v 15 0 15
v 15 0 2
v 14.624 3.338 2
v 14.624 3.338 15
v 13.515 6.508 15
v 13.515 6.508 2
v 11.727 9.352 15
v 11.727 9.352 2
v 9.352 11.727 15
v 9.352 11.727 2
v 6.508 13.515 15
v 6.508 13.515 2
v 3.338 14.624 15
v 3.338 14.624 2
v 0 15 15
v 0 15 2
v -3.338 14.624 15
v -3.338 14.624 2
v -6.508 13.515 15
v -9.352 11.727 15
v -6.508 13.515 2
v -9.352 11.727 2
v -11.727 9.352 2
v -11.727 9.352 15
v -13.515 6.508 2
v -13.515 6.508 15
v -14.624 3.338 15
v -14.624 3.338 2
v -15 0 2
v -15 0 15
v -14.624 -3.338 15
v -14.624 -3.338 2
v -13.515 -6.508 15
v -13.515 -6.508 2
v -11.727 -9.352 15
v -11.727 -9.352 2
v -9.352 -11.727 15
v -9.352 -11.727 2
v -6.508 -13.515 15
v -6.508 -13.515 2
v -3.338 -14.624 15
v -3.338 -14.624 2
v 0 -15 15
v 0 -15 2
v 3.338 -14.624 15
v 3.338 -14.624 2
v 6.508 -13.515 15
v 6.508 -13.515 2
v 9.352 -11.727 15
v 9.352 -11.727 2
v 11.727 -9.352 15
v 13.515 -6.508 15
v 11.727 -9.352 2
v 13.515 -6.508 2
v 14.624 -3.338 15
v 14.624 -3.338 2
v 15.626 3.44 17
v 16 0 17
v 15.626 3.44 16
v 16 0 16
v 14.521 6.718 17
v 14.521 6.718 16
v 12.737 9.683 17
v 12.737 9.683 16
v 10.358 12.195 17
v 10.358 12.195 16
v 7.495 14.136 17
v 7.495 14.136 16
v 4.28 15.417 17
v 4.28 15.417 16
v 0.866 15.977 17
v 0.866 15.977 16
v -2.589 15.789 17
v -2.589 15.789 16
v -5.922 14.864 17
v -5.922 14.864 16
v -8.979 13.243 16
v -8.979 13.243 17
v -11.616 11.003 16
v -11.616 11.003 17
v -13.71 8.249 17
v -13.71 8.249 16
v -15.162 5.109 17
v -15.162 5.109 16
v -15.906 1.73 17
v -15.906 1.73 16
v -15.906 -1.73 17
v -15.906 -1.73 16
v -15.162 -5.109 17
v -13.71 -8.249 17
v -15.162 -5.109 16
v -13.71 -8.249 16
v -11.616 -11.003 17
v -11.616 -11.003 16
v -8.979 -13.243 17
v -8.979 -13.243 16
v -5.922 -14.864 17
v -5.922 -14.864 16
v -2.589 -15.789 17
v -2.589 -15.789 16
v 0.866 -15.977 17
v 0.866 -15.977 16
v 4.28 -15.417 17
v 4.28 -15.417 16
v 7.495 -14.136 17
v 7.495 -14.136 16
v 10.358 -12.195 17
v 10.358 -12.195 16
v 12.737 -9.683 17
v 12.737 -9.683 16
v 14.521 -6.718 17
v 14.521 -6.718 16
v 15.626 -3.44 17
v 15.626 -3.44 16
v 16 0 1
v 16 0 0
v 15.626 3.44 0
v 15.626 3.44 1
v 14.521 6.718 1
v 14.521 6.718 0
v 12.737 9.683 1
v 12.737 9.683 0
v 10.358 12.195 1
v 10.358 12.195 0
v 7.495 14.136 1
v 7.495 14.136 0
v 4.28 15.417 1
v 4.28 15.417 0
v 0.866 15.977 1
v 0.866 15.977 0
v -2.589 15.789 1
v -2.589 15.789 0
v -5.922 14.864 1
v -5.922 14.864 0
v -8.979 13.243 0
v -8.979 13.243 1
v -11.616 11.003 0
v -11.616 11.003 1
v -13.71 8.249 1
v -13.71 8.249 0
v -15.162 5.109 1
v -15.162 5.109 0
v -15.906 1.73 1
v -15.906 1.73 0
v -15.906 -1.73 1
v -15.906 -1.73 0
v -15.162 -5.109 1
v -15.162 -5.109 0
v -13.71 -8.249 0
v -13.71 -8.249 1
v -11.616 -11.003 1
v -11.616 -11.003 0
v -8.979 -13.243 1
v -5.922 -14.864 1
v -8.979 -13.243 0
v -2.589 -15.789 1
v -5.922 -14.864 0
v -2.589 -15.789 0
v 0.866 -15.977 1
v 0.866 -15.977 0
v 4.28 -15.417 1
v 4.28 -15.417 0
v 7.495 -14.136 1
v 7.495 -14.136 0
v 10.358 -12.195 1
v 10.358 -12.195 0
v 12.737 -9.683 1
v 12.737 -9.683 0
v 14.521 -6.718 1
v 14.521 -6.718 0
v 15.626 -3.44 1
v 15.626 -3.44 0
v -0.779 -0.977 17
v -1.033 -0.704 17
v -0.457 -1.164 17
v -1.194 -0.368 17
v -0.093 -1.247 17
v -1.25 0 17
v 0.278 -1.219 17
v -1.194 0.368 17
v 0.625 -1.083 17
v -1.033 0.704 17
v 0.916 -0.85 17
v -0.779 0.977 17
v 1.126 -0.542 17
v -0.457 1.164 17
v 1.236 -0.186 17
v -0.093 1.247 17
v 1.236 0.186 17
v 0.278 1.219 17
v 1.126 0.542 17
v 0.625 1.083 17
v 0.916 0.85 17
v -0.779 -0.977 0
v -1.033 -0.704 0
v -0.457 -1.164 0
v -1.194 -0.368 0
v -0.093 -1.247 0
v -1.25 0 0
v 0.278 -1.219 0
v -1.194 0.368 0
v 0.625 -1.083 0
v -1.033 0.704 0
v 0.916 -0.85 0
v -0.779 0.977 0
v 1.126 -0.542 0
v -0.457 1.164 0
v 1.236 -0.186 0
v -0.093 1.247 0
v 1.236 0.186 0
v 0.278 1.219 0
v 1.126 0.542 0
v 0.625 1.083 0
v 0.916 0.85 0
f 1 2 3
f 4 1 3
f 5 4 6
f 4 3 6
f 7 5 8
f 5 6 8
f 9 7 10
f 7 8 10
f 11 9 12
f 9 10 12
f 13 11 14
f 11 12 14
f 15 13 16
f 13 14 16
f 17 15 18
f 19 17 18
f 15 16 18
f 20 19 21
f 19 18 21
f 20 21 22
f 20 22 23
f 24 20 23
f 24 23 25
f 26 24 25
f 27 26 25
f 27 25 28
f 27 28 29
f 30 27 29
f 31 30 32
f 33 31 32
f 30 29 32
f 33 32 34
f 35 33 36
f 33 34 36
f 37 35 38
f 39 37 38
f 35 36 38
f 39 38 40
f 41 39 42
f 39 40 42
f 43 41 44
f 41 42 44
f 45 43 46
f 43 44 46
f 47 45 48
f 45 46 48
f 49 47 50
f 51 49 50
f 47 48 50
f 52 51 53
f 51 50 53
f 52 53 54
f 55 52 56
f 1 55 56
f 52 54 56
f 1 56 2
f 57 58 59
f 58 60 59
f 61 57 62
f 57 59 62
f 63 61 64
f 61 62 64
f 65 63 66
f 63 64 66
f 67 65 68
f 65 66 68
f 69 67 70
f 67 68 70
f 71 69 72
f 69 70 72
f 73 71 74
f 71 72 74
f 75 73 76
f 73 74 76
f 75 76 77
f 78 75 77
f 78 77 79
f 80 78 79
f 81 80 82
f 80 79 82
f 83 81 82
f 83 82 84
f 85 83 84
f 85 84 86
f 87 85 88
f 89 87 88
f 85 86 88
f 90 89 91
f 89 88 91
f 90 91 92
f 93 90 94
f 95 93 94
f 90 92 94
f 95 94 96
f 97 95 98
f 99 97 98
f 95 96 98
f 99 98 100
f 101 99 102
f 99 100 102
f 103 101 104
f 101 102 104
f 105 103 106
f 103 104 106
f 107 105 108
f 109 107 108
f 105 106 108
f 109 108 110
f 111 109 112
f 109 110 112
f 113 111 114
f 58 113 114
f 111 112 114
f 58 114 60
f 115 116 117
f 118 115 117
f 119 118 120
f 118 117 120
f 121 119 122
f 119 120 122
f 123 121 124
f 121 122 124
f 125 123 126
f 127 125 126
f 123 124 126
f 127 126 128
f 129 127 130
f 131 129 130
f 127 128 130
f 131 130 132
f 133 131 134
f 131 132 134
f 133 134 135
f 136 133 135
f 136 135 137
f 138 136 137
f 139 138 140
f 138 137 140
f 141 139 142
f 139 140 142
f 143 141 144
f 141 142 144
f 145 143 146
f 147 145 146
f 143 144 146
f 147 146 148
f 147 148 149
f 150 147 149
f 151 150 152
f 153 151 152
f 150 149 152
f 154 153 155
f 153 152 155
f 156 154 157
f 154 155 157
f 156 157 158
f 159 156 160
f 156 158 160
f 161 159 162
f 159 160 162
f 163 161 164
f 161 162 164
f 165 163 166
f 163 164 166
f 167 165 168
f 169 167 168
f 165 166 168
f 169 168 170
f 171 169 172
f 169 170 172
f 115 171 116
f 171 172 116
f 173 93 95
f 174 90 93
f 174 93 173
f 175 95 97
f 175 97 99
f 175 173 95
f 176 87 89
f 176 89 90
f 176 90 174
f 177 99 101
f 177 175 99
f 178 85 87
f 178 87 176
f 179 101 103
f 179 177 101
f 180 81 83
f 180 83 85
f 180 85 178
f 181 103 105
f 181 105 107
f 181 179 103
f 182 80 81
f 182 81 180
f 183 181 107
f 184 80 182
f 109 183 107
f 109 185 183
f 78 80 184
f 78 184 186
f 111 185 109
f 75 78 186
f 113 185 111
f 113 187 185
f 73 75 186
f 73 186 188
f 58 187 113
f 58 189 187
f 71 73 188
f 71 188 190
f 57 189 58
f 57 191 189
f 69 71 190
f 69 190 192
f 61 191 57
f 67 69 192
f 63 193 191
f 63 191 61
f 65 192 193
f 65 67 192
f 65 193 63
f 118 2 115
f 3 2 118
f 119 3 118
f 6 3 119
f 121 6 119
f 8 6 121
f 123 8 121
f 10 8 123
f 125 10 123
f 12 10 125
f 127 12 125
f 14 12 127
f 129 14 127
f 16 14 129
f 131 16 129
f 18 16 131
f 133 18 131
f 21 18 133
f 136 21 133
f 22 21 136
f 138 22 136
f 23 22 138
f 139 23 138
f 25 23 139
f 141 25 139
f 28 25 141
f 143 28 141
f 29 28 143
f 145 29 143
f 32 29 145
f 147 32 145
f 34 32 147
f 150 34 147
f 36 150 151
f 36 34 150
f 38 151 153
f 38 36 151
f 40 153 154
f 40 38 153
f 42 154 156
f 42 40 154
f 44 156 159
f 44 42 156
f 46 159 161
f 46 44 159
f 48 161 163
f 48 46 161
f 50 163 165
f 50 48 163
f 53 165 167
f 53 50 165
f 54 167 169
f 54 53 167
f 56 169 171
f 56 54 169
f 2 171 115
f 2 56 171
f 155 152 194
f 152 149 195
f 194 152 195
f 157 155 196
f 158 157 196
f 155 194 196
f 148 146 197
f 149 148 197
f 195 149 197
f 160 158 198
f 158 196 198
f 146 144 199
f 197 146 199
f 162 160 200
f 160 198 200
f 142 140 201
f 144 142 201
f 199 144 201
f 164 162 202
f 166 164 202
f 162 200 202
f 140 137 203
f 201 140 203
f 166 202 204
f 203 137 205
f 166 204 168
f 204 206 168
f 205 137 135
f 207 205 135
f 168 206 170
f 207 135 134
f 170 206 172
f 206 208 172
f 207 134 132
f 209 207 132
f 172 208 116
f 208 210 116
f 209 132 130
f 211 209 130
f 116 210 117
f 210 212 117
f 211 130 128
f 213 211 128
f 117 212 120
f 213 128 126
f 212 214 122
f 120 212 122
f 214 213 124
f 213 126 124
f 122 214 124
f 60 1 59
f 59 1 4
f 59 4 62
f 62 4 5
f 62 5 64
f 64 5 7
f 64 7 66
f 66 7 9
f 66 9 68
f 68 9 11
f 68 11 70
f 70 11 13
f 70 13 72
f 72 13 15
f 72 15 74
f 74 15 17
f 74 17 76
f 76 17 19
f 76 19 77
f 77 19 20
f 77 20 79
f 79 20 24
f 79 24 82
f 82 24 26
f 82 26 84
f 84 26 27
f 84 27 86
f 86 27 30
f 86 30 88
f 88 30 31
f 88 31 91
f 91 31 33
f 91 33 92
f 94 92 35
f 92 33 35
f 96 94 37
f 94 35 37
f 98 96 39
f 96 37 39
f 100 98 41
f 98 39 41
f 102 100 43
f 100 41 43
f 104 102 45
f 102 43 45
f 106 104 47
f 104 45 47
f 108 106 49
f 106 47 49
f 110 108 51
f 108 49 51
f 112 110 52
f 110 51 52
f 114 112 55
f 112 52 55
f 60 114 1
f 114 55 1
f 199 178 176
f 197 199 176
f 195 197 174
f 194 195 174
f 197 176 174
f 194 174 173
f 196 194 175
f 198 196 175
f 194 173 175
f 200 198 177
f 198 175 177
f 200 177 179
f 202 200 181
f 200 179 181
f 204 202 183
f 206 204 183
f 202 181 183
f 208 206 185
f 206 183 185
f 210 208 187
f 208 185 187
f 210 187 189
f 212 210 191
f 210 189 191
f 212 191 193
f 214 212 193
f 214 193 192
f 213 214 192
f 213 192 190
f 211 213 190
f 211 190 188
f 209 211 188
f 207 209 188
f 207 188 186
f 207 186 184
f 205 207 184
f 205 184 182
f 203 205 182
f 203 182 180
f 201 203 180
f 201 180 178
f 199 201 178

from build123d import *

# Parameters (mm, degrees)
F0_R      = 16
F1_DEPTH  = 2
F2_SIZE   = 1
F4_R      = 15
F5_DEPTH  = 13
F6_R      = 16
F7_DEPTH  = 1
F8_SIZE   = 0.99999
F9_DEPTH  = 1
F10_R     = 1.25
F11_DEPTH = 2.5
F12_D     = 2.5


# Not quite as in the source:
# - a fillet or chamfer is up to 0.001 mm smaller than in the source, because OpenCascade refuses the exact size


with BuildPart() as f1:
    # F0 (on Top) → F1 (new body)
    with BuildSketch(Plane.XY):
        Circle(F0_R)
    extrude(amount=F1_DEPTH)

    # F2
    f2_edges = [f1.edges().sort_by_distance(p)[0] for p in [
        (-16, 0, 2),
    ]]
    chamfer(f2_edges, length=F2_SIZE)

    # F4 (on face) → F5 (join)
    with BuildSketch(Plane.XY.offset(2)):
        Circle(F4_R)
    extrude(amount=F5_DEPTH)

    # F6 (on face) → F7 (join)
    with BuildSketch(Plane.XY.offset(15)):
        Circle(F6_R)
    extrude(amount=F7_DEPTH)

    # F8 (size 1 in the source; OpenCascade refuses exactly that, so slightly less here)
    f8_edges = [f1.edges().sort_by_distance(p)[0] for p in [
        (-16, 0, 15),
    ]]
    chamfer(f8_edges, length=F8_SIZE)

    # F9 (add): a face of the model
    f9_faces = [f1.faces().sort_by_distance(p)[0] for p in [
        (0, 0, 16),
    ]]
    extrude(f9_faces, amount=F9_DEPTH)

    # F10 (on face) → F11 (cut)
    with BuildSketch(Plane.XY):
        Circle(F10_R)
    extrude(amount=-F11_DEPTH, mode=Mode.SUBTRACT)

    # F12 (through all)
    with Locations(Plane(origin=(0, 0, 0), x_dir=(1, 0, 0), z_dir=(0, 0, -1))):
        with Locations((0, 0)):
            Hole(F12_D / 2)


solid = f1.part
